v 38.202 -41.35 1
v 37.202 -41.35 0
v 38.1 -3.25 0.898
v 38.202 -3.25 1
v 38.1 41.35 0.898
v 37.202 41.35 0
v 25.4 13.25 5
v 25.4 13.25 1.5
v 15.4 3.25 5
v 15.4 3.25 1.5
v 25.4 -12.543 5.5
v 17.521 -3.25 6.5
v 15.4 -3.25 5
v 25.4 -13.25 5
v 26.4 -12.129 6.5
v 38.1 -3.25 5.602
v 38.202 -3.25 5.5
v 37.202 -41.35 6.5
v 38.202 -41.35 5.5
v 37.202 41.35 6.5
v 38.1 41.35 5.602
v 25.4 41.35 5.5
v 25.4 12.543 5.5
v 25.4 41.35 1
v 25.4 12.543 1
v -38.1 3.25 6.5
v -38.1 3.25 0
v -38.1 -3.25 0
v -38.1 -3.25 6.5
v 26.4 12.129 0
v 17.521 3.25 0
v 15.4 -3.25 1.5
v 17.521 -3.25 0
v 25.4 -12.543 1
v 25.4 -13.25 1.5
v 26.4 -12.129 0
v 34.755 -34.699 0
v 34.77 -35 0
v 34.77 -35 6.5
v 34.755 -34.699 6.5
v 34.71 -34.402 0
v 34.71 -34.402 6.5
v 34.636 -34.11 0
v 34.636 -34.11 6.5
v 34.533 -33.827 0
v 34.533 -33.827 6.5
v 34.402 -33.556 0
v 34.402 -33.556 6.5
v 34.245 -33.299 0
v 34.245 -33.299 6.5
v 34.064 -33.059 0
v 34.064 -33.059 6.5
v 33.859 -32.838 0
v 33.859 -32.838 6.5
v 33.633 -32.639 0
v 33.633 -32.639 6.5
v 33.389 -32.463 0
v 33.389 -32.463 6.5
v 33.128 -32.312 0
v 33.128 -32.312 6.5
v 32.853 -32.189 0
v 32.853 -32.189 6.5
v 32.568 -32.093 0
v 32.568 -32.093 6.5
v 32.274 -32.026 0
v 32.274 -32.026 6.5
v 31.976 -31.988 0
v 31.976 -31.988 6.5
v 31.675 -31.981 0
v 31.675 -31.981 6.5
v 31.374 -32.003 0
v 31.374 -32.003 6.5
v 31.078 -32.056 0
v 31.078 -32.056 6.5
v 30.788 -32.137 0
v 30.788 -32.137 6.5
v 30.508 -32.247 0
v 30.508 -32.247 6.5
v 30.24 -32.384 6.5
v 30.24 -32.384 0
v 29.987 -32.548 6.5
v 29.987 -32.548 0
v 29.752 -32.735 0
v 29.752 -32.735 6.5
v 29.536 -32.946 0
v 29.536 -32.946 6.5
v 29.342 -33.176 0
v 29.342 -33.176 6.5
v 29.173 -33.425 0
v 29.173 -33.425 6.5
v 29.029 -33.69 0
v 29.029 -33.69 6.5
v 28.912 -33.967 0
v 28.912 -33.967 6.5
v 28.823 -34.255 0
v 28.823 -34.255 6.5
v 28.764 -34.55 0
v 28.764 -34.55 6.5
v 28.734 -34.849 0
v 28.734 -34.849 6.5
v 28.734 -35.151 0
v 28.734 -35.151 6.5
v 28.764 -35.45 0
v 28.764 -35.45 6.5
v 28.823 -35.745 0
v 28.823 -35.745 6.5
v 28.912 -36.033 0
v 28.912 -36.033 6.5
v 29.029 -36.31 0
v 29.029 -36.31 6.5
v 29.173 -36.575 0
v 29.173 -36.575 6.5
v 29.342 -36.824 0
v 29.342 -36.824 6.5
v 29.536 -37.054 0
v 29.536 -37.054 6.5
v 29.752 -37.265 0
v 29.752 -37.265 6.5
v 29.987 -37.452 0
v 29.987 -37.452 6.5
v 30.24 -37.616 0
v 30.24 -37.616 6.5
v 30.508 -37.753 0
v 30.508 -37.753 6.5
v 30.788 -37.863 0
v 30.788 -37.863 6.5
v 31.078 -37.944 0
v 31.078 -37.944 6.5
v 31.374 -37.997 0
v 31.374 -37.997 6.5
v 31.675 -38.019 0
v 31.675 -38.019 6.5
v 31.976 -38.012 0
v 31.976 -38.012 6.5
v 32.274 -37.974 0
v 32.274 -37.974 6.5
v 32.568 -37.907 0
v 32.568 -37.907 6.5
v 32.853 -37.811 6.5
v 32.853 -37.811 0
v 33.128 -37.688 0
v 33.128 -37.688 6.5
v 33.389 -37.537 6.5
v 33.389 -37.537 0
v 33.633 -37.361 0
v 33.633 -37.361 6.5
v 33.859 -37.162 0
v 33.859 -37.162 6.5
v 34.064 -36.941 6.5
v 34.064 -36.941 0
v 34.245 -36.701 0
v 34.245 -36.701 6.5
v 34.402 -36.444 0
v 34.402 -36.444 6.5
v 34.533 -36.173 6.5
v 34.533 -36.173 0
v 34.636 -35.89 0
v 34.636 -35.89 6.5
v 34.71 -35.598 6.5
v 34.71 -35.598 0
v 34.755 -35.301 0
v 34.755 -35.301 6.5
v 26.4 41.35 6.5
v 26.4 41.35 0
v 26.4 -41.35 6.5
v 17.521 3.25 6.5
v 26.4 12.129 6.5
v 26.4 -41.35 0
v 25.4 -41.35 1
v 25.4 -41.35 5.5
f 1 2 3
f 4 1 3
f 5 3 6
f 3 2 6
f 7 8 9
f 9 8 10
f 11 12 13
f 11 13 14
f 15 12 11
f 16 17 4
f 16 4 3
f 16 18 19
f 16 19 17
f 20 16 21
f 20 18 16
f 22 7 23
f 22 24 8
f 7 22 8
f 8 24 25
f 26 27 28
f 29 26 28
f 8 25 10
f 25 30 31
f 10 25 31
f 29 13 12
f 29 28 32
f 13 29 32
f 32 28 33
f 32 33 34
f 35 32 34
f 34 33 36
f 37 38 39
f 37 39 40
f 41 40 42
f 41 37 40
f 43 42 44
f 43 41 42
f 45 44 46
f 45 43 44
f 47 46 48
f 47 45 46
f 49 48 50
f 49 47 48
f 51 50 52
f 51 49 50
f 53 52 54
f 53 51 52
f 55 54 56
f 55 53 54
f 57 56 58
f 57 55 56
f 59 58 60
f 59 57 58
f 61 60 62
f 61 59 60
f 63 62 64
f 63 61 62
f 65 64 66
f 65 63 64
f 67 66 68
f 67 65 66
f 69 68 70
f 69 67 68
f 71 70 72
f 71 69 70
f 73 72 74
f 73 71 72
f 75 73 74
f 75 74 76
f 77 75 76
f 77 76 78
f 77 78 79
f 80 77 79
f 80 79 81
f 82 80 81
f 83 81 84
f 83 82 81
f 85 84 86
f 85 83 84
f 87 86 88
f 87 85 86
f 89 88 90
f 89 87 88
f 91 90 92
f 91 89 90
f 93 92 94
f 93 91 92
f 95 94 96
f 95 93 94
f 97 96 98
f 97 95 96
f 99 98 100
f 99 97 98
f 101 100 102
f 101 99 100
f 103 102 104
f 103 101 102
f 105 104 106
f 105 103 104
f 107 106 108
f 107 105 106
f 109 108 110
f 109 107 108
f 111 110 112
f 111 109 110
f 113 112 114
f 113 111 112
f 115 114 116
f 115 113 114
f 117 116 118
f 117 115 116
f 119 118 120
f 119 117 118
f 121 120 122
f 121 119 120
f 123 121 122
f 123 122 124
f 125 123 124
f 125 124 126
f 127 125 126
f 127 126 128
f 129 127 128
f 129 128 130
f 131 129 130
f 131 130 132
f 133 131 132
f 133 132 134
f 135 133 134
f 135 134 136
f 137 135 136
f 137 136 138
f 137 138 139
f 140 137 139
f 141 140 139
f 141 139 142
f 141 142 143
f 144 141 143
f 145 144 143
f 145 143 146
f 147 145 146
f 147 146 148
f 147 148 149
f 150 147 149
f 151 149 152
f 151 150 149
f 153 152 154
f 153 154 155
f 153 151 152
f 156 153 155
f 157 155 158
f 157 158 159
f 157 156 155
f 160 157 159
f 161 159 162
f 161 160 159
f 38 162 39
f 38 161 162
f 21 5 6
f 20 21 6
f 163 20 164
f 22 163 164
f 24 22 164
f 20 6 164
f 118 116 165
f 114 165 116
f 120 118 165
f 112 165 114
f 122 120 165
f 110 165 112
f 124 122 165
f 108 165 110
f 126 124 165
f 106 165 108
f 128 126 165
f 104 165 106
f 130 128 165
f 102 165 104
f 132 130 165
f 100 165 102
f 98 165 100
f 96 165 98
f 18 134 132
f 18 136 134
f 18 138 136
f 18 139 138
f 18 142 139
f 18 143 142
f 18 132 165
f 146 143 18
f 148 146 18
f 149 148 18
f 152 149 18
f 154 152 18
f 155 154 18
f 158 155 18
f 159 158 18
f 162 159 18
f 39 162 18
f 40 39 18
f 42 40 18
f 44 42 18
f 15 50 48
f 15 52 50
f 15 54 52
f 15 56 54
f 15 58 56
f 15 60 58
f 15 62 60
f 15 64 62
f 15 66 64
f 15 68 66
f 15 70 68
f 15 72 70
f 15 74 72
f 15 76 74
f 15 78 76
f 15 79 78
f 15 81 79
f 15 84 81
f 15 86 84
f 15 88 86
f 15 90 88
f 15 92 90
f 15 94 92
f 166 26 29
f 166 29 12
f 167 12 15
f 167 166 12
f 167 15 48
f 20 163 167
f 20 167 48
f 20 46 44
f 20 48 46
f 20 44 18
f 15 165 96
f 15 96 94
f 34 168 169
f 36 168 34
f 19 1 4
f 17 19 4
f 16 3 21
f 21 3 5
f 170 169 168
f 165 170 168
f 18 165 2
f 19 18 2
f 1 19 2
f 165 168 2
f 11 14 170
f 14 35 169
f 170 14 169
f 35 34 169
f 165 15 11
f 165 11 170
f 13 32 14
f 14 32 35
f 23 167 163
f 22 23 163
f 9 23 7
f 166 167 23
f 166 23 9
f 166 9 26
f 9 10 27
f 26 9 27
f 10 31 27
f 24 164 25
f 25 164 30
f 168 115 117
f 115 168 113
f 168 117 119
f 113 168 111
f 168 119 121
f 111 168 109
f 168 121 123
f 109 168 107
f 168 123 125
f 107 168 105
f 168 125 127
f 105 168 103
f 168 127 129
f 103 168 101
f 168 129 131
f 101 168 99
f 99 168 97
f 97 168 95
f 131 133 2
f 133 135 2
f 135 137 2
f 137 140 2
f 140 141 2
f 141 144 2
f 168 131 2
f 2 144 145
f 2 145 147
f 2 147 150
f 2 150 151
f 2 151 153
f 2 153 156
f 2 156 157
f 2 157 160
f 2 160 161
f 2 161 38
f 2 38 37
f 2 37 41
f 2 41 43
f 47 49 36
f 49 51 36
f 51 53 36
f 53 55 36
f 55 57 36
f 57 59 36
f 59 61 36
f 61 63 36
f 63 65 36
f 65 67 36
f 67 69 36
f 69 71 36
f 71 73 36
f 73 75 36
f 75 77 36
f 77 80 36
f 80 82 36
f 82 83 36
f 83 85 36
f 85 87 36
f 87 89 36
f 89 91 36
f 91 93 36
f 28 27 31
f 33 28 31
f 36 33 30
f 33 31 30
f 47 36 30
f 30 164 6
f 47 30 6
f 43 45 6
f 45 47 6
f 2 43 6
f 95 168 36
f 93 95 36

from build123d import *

# Parameters (mm, degrees)
F0_R     = 3.020218
F1_DEPTH = 6.5
F2_SIZE  = 1.5
F3_SIZE  = 1


with BuildPart() as f1:
    # F0 (on Top) → F1 (new body)
    with BuildSketch(Plane.XY):
        Polygon((38.1, -3.25), (38.1, 3.25), (25.4, 3.25), (15.4, 3.25), (-38.1, 3.25), (-38.1, -3.25), (15.4, -3.25), (25.4, -3.25), align=None)
        Polygon((25.4, 3.25), (38.1, 3.25), (38.1, 41.35), (25.4, 41.35), (25.4, 13.25), align=None)
        Polygon((15.4, 3.25), (25.4, 3.25), (25.4, 13.25), align=None)
        Polygon((38.201772, -3.25), (38.1, -3.25), (25.4, -3.25), (25.4, -13.25), (25.4, -41.35), (38.201772, -41.35), align=None)
        with Locations((31.75, -35)):
            Circle(F0_R, mode=Mode.SUBTRACT)
        Polygon((25.4, -13.25), (25.4, -3.25), (15.4, -3.25), align=None)
    extrude(amount=F1_DEPTH)

    # F2
    f2_edges = [f1.edges().sort_by_distance(p)[0] for p in [
        (20.4, -8.25, 6.5),
        (20.4, 8.25, 6.5),
        (20.4, 8.25, 0),
        (20.4, -8.25, 0),
    ]]
    chamfer(f2_edges, length=F2_SIZE)

    # F3
    f3_edges = [f1.edges().sort_by_distance(p)[0] for p in [
        (25.4, -27.3, 6.5),
        (25.4, -27.3, 0),
        (25.4, 27.3, 6.5),
        (25.4, 27.3, 0),
        (38.201772, -22.3, 6.5),
        (38.201772, -22.3, 0),
    ]]
    chamfer(f3_edges, length=F3_SIZE)


solid = f1.part
